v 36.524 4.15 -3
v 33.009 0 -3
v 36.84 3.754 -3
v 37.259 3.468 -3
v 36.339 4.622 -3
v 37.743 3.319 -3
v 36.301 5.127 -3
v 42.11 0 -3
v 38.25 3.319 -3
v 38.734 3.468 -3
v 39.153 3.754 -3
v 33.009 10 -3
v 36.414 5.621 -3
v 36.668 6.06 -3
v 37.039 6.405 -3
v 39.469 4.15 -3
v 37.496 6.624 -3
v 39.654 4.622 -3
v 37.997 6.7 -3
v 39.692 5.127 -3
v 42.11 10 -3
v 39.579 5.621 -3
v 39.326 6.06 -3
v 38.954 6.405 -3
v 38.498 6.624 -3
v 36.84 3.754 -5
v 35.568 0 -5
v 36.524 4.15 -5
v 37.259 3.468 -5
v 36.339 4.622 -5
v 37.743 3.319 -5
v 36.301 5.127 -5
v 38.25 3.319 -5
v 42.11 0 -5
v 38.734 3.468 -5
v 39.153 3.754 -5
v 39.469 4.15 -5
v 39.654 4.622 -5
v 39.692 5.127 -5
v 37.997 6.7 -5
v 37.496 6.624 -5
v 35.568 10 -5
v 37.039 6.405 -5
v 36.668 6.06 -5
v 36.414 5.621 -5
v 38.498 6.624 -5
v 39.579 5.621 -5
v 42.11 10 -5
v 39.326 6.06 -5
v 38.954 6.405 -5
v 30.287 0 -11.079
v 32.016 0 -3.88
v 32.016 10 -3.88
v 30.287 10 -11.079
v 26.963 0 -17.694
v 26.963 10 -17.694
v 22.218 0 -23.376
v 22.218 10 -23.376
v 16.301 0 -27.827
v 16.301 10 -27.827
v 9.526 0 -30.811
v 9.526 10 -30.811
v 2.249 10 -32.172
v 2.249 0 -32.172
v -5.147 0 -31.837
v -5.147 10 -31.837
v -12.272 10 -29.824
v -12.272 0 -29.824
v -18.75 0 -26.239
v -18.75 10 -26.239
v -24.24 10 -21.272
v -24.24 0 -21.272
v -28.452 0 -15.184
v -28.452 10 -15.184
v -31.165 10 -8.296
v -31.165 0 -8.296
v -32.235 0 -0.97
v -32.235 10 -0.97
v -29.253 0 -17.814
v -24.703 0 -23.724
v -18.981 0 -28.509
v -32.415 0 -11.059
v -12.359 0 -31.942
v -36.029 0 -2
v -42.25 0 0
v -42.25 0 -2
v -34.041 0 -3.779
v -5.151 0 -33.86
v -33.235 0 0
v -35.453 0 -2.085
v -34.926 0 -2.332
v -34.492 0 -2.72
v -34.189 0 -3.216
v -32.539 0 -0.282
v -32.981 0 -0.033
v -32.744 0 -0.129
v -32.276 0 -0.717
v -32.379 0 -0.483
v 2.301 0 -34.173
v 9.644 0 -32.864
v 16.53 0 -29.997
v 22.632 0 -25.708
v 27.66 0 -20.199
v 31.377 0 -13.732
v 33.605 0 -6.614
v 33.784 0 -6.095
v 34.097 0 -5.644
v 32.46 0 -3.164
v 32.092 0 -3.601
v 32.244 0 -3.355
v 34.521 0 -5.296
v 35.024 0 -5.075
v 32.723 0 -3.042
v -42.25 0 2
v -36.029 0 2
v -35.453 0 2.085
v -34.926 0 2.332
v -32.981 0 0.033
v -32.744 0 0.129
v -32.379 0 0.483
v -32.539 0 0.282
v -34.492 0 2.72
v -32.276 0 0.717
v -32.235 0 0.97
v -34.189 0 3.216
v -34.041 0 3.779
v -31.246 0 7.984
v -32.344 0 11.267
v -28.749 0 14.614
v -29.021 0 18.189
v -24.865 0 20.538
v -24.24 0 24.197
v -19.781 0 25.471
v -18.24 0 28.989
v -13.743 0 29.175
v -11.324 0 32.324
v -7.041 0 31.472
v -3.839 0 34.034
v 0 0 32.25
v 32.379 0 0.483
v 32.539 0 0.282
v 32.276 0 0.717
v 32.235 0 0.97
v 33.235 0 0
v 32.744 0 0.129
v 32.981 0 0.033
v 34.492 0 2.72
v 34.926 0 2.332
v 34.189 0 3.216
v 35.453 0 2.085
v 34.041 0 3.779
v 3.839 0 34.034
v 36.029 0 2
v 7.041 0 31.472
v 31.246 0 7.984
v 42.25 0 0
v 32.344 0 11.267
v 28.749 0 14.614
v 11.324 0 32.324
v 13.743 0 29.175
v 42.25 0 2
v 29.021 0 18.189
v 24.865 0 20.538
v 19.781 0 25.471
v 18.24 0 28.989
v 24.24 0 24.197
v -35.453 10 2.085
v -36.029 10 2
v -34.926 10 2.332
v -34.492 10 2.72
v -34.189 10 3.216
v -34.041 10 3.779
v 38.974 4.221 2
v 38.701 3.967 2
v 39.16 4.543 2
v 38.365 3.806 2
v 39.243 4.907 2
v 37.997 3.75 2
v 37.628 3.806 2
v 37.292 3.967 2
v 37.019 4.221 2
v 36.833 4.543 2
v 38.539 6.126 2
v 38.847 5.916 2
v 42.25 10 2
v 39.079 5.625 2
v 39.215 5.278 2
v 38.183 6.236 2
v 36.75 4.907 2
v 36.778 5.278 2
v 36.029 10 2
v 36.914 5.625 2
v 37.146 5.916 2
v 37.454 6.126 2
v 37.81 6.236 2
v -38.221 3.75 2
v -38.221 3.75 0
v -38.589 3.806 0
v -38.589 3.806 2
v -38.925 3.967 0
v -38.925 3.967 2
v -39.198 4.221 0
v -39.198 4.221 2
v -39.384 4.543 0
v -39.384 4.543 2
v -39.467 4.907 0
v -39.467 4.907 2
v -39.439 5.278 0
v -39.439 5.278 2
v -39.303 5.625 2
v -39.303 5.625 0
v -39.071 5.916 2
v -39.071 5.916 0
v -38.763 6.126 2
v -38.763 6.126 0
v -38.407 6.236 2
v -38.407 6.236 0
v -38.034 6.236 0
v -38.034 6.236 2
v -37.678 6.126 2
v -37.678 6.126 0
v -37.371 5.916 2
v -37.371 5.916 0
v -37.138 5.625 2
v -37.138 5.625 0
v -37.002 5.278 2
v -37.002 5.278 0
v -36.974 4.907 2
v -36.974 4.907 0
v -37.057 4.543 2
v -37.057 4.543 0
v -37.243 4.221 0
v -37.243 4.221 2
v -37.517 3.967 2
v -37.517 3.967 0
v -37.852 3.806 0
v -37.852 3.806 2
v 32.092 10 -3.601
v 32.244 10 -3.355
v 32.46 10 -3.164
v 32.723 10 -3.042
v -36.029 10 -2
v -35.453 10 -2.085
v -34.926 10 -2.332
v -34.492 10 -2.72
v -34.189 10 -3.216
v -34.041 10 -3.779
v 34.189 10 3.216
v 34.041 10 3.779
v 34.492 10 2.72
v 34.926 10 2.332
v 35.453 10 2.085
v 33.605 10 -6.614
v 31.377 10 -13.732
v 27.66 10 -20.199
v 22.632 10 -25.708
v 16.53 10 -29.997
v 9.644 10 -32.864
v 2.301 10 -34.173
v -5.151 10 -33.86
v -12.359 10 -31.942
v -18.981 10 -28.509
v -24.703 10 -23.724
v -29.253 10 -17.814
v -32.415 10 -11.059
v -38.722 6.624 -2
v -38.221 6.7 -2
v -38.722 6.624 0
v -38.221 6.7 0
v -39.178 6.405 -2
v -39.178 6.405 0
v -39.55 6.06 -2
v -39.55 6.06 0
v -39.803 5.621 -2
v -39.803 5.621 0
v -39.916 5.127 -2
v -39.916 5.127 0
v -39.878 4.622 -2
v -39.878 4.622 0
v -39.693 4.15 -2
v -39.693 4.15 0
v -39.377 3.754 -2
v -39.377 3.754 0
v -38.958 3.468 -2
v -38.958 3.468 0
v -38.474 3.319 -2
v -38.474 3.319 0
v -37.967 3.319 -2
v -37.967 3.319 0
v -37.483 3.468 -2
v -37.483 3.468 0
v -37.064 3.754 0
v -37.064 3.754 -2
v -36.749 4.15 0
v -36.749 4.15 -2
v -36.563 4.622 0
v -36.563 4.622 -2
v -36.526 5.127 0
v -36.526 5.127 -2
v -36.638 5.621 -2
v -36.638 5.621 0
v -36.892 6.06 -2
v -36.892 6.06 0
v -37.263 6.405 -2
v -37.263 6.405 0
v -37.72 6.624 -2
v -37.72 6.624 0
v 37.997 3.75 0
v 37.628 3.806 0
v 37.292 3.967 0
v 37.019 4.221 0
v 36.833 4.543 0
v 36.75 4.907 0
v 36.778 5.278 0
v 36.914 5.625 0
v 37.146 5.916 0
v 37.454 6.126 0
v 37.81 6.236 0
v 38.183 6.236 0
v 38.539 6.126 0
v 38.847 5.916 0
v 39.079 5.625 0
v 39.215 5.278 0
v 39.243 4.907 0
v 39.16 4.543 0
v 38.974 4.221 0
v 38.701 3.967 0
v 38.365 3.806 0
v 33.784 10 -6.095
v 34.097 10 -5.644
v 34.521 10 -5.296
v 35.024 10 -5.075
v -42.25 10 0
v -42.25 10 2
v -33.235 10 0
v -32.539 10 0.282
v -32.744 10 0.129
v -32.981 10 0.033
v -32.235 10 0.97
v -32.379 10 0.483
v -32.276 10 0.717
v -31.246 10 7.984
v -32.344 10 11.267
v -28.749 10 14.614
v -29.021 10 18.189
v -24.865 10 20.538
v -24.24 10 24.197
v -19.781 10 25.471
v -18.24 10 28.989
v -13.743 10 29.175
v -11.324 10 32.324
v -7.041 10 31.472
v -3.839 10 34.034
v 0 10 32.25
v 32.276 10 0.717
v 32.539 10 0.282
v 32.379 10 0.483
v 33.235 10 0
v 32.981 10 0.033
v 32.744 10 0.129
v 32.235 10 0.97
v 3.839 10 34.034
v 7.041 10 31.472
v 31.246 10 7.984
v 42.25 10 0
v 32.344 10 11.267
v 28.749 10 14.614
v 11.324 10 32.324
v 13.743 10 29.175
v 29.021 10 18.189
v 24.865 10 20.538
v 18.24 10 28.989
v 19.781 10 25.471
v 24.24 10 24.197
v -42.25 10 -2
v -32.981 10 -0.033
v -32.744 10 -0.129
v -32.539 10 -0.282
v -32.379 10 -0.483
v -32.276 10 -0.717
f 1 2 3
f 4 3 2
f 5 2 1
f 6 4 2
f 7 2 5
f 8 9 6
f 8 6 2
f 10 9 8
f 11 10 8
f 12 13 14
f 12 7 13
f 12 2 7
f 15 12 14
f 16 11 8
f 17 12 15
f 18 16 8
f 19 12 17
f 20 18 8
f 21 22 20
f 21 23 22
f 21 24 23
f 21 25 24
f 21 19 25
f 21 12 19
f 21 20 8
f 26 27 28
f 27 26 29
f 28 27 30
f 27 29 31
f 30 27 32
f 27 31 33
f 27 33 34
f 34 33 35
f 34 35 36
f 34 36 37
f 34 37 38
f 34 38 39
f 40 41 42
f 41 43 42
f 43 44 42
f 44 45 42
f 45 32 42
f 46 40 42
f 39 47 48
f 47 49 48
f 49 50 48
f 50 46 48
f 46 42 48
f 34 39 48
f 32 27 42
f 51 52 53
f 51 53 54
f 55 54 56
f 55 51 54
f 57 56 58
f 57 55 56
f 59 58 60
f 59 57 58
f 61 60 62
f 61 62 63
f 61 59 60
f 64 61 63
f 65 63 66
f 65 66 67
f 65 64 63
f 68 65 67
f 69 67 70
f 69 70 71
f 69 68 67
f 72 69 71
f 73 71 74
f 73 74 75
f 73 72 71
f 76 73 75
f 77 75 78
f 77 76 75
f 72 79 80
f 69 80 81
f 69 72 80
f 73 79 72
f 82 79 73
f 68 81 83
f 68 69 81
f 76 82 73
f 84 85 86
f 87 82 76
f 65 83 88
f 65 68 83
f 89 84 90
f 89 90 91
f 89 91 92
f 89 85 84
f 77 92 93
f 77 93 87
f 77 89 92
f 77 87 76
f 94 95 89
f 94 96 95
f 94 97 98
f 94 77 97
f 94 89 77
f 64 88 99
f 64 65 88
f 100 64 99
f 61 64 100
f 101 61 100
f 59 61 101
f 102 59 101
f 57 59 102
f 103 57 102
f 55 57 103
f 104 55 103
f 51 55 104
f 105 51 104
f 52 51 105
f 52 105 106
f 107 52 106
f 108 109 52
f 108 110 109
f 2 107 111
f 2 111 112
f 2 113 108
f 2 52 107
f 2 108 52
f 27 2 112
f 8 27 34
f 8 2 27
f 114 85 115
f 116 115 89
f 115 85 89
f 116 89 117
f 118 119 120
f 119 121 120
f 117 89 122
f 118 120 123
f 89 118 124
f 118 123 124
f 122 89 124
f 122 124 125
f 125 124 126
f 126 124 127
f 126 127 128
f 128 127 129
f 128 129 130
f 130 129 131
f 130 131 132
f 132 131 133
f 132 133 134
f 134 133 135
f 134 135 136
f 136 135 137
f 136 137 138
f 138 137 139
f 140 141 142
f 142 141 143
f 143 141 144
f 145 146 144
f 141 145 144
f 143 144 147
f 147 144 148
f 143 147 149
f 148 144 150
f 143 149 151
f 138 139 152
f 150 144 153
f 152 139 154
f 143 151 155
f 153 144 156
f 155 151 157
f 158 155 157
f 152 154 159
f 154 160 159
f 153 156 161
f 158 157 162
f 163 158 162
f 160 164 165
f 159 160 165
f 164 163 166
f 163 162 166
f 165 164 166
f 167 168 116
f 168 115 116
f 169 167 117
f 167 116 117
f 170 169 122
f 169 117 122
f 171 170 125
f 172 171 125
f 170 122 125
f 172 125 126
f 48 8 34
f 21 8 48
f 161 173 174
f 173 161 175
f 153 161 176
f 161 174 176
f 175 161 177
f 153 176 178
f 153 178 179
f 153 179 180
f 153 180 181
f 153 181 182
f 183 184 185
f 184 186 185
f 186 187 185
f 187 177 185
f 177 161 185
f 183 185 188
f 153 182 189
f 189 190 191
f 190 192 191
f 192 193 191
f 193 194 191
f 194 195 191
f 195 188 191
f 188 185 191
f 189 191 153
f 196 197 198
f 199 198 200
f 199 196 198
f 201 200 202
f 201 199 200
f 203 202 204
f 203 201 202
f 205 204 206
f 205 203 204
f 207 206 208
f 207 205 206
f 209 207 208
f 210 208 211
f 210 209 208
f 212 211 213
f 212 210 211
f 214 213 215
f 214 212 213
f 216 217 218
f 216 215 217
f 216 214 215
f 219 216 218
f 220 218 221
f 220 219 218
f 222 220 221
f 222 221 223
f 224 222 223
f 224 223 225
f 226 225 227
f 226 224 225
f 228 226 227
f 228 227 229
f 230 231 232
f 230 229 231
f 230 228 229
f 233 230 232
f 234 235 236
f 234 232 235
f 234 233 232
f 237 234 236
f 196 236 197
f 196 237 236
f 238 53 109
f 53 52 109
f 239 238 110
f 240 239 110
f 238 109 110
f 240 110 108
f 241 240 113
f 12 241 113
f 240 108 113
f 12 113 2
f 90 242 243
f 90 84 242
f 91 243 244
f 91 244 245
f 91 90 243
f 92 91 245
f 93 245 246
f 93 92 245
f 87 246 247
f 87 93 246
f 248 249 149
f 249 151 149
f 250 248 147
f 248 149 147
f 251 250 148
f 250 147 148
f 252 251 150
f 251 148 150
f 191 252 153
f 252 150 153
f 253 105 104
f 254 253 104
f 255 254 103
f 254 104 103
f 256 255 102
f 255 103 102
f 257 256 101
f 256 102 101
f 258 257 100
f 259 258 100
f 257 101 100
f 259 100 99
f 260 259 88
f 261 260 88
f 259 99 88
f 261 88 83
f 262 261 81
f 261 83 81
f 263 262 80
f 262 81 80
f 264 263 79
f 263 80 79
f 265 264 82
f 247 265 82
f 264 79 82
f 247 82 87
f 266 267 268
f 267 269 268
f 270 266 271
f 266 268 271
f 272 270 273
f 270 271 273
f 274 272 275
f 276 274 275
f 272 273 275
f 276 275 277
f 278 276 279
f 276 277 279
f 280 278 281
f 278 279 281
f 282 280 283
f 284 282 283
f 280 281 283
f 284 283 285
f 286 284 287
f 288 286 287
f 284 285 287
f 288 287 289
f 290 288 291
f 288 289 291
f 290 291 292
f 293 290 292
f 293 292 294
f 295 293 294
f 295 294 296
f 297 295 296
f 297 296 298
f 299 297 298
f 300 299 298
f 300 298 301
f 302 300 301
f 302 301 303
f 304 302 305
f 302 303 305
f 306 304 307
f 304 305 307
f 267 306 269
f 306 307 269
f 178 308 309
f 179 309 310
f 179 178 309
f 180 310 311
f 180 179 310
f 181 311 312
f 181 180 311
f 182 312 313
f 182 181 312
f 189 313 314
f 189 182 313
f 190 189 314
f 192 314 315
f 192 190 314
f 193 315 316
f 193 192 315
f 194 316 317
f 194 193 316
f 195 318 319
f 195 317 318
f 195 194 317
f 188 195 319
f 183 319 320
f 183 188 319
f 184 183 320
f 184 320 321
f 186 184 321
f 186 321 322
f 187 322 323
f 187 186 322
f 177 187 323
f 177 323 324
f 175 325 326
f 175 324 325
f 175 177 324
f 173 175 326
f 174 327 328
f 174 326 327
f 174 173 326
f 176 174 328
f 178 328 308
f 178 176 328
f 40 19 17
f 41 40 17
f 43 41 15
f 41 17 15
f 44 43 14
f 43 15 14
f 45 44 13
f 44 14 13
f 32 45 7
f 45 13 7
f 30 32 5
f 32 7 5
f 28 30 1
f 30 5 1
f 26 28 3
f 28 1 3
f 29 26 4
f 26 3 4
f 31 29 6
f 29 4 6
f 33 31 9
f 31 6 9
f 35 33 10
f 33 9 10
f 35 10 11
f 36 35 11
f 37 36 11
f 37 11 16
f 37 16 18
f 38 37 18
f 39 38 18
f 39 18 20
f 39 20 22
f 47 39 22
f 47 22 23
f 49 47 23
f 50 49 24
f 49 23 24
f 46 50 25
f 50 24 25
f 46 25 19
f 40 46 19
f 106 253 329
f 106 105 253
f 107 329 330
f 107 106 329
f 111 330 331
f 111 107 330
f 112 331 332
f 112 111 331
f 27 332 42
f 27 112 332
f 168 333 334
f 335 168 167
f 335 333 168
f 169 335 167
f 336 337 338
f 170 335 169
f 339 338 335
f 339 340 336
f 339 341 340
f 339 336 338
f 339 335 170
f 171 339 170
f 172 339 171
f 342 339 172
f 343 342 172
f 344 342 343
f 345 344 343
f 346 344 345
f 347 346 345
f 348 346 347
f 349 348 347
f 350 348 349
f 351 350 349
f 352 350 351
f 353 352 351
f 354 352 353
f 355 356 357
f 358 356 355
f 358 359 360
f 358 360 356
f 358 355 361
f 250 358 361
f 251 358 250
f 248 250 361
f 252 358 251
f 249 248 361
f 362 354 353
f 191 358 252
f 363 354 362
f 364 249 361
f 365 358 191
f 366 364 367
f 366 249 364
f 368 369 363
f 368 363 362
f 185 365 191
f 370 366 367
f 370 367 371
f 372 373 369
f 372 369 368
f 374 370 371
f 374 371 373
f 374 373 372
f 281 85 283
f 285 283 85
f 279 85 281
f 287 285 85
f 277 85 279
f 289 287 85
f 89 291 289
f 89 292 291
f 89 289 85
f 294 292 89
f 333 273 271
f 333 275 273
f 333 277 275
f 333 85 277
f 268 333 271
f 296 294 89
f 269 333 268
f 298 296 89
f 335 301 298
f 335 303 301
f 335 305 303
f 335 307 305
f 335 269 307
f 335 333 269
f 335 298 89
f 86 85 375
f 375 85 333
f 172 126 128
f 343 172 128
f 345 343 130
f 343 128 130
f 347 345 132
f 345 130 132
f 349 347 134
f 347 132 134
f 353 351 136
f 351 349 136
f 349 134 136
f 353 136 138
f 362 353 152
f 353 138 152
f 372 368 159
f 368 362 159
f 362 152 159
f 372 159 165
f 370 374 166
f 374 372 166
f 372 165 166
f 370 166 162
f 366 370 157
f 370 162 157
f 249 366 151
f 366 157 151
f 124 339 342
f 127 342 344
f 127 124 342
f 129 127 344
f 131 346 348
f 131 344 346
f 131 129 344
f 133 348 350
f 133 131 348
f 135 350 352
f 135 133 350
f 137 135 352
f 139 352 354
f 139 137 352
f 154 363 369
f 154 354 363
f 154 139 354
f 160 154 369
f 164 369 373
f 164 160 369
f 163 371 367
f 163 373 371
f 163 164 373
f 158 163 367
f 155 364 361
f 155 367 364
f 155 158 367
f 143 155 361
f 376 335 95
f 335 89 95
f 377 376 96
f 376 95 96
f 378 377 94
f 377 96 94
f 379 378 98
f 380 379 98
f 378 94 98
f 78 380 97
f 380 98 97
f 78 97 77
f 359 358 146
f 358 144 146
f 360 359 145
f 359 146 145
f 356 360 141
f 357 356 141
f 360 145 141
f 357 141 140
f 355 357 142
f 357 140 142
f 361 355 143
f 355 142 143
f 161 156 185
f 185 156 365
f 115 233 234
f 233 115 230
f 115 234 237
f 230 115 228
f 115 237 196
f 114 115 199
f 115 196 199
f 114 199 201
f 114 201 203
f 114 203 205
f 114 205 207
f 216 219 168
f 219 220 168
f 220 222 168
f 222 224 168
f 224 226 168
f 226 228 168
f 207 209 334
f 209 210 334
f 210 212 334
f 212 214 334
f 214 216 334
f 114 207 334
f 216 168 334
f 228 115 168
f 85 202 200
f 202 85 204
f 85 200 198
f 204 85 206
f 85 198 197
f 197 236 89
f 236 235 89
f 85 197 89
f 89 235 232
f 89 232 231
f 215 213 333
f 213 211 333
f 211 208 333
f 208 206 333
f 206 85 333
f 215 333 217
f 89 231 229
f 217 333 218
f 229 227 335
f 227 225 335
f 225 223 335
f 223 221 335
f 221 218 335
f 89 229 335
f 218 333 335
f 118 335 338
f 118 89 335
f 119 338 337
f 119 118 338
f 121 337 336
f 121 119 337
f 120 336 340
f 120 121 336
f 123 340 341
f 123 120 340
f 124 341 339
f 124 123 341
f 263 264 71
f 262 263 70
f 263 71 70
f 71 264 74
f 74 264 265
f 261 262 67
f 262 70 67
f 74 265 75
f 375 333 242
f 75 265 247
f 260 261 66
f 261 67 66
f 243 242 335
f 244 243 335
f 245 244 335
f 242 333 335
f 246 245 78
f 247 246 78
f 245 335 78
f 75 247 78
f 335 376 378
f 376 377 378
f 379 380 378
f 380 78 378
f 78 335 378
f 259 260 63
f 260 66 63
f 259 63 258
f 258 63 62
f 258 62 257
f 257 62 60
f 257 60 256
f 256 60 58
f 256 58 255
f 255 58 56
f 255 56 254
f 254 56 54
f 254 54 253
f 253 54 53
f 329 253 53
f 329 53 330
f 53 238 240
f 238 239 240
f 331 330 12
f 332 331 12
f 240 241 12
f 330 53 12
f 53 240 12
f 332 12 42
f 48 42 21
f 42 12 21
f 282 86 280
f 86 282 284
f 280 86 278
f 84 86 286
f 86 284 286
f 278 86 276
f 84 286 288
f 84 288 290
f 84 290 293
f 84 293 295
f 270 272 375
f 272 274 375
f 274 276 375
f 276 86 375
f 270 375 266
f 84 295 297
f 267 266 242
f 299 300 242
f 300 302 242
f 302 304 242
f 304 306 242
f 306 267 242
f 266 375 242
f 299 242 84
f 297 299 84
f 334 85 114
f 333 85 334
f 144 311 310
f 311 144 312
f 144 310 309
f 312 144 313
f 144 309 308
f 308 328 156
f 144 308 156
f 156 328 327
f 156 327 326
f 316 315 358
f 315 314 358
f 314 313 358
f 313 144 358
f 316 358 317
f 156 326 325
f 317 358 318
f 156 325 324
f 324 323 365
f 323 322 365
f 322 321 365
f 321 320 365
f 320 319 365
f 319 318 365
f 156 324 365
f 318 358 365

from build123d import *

# Parameters (mm, degrees)
SKETCH_1_R                 = 34.25
SKETCH_1_R_2               = 32.25
EXTRUDE_1_DEPTH            = 10
SKETCH_2_W                 = 6.503294728
SKETCH_2_H                 = 3
CUT_EXTRUDE_1_DEPTH        = 50.458315782
SKETCH_5_W                 = 10
SKETCH_5_H                 = 10
EXTRUDE_2_DEPTH            = 2
SKETCH_6_W                 = 10
SKETCH_6_H                 = 10
EXTRUDE_3_DEPTH            = 2
SKETCH_10_W                = 10
SKETCH_10_H                = 10
EXTRUDE_4_DEPTH            = 2
SKETCH_8_W                 = 1.7
SKETCH_8_H                 = 39.25
HOLE_WIZARD_M31_AT_2_COUNT = 2
HOLE_WIZARD_M31_AT_2_PITCH = 76.217394456
M3X0_51_AT_2_COUNT         = 2
M3X0_51_AT_2_PITCH         = 76.217394456
FILLET_1_R                 = 2
FILLET_3_R                 = 1
FILLET_4_R                 = 1
FILLET_5_R                 = 2


with BuildPart() as part:
    # Эскиз1 → Бобышка-Вытянуть1 (new body)
    with BuildSketch(Plane(origin=(0, 0, 0), x_dir=(1, 0, 0), z_dir=(0, 1, 0))):
        with Locations(Location((0, 0, 0), (0, 0, 270))):
            Circle(SKETCH_1_R)
        with Locations(Location((0, 0, 0), (0, 0, 270))):
            Circle(SKETCH_1_R_2, mode=Mode.SUBTRACT)
    extrude(amount=EXTRUDE_1_DEPTH)


with BuildPart() as body_2:
    # Split Bodies 1: the piece on the far side of the plane
    add(part.part)
    split(bisect_by=Plane.XY, keep=Keep.BOTTOM)

    # Эскиз2 → Вырез-Вытянуть1 (cut, through all)
    with BuildSketch(Plane(origin=(0, 10, 0), x_dir=(1, 0, 0), z_dir=(0, 1, 0))):
        with Locations((30.998352636, 1.5)):
            Rectangle(SKETCH_2_W, SKETCH_2_H)
    extrude(amount=-CUT_EXTRUDE_1_DEPTH, mode=Mode.SUBTRACT)

    # Эскиз5 → Бобышка-Вытянуть2 (add)
    with BuildSketch(Plane.XY.offset(-3)):
        with Locations((37.110161943, 5)):
            Rectangle(SKETCH_5_W, SKETCH_5_H)
    extrude(amount=-EXTRUDE_2_DEPTH)

    # Эскиз6 → Бобышка-Вытянуть3 (add)
    with BuildSketch(Plane.XY):
        with Locations((-37.25, 5)):
            Rectangle(SKETCH_6_W, SKETCH_6_H)
    extrude(amount=-EXTRUDE_3_DEPTH)

    # Эскиз8 → Отверстие с зазором M31 (revolve, cut)
    with BuildSketch(Plane(origin=(37.996616469, 5, -5), x_dir=(0, 1, 0), z_dir=(1, 0, 0))):
        with Locations((0.85, 19.625)):
            Rectangle(SKETCH_8_W, SKETCH_8_H)
    hole_wizard_m31 = revolve(axis=Axis((37.996616469, 5, -11.35), (0, 0, 1)), mode=Mode.SUBTRACT)

    # Отверстие с зазором M31 at 2: Отверстие с зазором M31 ×2
    with Locations(*[(-i * HOLE_WIZARD_M31_AT_2_PITCH, 0, 0) for i in range(1, HOLE_WIZARD_M31_AT_2_COUNT)]):
        add(hole_wizard_m31, mode=Mode.SUBTRACT)

    # Скругление1
    fillet_1_edges = [body_2.edges().sort_by_distance(p)[0] for p in [
        (33.883070994, 5, -5),
        (-34.191555975, 5, -2),
    ]]
    fillet(fillet_1_edges, radius=FILLET_1_R)

    # Скругление3
    fillet_3_edges = [body_2.edges().sort_by_distance(p)[0] for p in [
        (32.110161943, 5, -3),
        (-32.25, 5, 0),
    ]]
    fillet(fillet_3_edges, radius=FILLET_3_R)


with BuildPart() as part_1:
    add(part.part)

    # Split Bodies 1
    split(bisect_by=Plane.XY, keep=Keep.TOP)

    # Эскиз10 → Бобышка-Вытянуть4 (add)
    with BuildSketch(Plane(origin=(0, 0, 0), x_dir=(-1, 0, 0), z_dir=(0, 0, -1))):
        with Locations((37.25, 5)):
            Rectangle(SKETCH_10_W, SKETCH_10_H)
        with Locations((-37.25, 5)):
            Rectangle(SKETCH_10_W, SKETCH_10_H)
    extrude(amount=-EXTRUDE_4_DEPTH)

    # Эскиз11 → Отверстие обработанное метчиком M3x0.51 (revolve, cut)
    with BuildSketch(Plane(origin=(37.996616469, 5, 2), x_dir=(0, -1, 0), z_dir=(1, 0, 0))):
        Polygon((0, 0), (0, 9.251075774), (1.25, 8.5), (1.25, 0), align=None)
    m3x0_51 = revolve(axis=Axis((37.996616469, 5, 8.35), (0, 0, -1)), mode=Mode.SUBTRACT)

    # Отверстие обработанное метчиком M3x0.51 at 2: Отверстие обработанное метчиком M3x0.51 ×2
    with Locations(*[(-i * M3X0_51_AT_2_PITCH, 0, 0) for i in range(1, M3X0_51_AT_2_COUNT)]):
        add(m3x0_51, mode=Mode.SUBTRACT)

    # Скругление4
    fillet_4_edges = [part_1.edges().sort_by_distance(p)[0] for p in [
        (-32.25, 5, 0),
        (32.25, 5, 0),
    ]]
    fillet(fillet_4_edges, radius=FILLET_4_R)

    # Скругление5
    fillet_5_edges = [part_1.edges().sort_by_distance(p)[0] for p in [
        (-34.191555975, 5, 2),
        (34.191555975, 5, 2),
    ]]
    fillet(fillet_5_edges, radius=FILLET_5_R)


solid = Compound([body_2.part, part_1.part])
